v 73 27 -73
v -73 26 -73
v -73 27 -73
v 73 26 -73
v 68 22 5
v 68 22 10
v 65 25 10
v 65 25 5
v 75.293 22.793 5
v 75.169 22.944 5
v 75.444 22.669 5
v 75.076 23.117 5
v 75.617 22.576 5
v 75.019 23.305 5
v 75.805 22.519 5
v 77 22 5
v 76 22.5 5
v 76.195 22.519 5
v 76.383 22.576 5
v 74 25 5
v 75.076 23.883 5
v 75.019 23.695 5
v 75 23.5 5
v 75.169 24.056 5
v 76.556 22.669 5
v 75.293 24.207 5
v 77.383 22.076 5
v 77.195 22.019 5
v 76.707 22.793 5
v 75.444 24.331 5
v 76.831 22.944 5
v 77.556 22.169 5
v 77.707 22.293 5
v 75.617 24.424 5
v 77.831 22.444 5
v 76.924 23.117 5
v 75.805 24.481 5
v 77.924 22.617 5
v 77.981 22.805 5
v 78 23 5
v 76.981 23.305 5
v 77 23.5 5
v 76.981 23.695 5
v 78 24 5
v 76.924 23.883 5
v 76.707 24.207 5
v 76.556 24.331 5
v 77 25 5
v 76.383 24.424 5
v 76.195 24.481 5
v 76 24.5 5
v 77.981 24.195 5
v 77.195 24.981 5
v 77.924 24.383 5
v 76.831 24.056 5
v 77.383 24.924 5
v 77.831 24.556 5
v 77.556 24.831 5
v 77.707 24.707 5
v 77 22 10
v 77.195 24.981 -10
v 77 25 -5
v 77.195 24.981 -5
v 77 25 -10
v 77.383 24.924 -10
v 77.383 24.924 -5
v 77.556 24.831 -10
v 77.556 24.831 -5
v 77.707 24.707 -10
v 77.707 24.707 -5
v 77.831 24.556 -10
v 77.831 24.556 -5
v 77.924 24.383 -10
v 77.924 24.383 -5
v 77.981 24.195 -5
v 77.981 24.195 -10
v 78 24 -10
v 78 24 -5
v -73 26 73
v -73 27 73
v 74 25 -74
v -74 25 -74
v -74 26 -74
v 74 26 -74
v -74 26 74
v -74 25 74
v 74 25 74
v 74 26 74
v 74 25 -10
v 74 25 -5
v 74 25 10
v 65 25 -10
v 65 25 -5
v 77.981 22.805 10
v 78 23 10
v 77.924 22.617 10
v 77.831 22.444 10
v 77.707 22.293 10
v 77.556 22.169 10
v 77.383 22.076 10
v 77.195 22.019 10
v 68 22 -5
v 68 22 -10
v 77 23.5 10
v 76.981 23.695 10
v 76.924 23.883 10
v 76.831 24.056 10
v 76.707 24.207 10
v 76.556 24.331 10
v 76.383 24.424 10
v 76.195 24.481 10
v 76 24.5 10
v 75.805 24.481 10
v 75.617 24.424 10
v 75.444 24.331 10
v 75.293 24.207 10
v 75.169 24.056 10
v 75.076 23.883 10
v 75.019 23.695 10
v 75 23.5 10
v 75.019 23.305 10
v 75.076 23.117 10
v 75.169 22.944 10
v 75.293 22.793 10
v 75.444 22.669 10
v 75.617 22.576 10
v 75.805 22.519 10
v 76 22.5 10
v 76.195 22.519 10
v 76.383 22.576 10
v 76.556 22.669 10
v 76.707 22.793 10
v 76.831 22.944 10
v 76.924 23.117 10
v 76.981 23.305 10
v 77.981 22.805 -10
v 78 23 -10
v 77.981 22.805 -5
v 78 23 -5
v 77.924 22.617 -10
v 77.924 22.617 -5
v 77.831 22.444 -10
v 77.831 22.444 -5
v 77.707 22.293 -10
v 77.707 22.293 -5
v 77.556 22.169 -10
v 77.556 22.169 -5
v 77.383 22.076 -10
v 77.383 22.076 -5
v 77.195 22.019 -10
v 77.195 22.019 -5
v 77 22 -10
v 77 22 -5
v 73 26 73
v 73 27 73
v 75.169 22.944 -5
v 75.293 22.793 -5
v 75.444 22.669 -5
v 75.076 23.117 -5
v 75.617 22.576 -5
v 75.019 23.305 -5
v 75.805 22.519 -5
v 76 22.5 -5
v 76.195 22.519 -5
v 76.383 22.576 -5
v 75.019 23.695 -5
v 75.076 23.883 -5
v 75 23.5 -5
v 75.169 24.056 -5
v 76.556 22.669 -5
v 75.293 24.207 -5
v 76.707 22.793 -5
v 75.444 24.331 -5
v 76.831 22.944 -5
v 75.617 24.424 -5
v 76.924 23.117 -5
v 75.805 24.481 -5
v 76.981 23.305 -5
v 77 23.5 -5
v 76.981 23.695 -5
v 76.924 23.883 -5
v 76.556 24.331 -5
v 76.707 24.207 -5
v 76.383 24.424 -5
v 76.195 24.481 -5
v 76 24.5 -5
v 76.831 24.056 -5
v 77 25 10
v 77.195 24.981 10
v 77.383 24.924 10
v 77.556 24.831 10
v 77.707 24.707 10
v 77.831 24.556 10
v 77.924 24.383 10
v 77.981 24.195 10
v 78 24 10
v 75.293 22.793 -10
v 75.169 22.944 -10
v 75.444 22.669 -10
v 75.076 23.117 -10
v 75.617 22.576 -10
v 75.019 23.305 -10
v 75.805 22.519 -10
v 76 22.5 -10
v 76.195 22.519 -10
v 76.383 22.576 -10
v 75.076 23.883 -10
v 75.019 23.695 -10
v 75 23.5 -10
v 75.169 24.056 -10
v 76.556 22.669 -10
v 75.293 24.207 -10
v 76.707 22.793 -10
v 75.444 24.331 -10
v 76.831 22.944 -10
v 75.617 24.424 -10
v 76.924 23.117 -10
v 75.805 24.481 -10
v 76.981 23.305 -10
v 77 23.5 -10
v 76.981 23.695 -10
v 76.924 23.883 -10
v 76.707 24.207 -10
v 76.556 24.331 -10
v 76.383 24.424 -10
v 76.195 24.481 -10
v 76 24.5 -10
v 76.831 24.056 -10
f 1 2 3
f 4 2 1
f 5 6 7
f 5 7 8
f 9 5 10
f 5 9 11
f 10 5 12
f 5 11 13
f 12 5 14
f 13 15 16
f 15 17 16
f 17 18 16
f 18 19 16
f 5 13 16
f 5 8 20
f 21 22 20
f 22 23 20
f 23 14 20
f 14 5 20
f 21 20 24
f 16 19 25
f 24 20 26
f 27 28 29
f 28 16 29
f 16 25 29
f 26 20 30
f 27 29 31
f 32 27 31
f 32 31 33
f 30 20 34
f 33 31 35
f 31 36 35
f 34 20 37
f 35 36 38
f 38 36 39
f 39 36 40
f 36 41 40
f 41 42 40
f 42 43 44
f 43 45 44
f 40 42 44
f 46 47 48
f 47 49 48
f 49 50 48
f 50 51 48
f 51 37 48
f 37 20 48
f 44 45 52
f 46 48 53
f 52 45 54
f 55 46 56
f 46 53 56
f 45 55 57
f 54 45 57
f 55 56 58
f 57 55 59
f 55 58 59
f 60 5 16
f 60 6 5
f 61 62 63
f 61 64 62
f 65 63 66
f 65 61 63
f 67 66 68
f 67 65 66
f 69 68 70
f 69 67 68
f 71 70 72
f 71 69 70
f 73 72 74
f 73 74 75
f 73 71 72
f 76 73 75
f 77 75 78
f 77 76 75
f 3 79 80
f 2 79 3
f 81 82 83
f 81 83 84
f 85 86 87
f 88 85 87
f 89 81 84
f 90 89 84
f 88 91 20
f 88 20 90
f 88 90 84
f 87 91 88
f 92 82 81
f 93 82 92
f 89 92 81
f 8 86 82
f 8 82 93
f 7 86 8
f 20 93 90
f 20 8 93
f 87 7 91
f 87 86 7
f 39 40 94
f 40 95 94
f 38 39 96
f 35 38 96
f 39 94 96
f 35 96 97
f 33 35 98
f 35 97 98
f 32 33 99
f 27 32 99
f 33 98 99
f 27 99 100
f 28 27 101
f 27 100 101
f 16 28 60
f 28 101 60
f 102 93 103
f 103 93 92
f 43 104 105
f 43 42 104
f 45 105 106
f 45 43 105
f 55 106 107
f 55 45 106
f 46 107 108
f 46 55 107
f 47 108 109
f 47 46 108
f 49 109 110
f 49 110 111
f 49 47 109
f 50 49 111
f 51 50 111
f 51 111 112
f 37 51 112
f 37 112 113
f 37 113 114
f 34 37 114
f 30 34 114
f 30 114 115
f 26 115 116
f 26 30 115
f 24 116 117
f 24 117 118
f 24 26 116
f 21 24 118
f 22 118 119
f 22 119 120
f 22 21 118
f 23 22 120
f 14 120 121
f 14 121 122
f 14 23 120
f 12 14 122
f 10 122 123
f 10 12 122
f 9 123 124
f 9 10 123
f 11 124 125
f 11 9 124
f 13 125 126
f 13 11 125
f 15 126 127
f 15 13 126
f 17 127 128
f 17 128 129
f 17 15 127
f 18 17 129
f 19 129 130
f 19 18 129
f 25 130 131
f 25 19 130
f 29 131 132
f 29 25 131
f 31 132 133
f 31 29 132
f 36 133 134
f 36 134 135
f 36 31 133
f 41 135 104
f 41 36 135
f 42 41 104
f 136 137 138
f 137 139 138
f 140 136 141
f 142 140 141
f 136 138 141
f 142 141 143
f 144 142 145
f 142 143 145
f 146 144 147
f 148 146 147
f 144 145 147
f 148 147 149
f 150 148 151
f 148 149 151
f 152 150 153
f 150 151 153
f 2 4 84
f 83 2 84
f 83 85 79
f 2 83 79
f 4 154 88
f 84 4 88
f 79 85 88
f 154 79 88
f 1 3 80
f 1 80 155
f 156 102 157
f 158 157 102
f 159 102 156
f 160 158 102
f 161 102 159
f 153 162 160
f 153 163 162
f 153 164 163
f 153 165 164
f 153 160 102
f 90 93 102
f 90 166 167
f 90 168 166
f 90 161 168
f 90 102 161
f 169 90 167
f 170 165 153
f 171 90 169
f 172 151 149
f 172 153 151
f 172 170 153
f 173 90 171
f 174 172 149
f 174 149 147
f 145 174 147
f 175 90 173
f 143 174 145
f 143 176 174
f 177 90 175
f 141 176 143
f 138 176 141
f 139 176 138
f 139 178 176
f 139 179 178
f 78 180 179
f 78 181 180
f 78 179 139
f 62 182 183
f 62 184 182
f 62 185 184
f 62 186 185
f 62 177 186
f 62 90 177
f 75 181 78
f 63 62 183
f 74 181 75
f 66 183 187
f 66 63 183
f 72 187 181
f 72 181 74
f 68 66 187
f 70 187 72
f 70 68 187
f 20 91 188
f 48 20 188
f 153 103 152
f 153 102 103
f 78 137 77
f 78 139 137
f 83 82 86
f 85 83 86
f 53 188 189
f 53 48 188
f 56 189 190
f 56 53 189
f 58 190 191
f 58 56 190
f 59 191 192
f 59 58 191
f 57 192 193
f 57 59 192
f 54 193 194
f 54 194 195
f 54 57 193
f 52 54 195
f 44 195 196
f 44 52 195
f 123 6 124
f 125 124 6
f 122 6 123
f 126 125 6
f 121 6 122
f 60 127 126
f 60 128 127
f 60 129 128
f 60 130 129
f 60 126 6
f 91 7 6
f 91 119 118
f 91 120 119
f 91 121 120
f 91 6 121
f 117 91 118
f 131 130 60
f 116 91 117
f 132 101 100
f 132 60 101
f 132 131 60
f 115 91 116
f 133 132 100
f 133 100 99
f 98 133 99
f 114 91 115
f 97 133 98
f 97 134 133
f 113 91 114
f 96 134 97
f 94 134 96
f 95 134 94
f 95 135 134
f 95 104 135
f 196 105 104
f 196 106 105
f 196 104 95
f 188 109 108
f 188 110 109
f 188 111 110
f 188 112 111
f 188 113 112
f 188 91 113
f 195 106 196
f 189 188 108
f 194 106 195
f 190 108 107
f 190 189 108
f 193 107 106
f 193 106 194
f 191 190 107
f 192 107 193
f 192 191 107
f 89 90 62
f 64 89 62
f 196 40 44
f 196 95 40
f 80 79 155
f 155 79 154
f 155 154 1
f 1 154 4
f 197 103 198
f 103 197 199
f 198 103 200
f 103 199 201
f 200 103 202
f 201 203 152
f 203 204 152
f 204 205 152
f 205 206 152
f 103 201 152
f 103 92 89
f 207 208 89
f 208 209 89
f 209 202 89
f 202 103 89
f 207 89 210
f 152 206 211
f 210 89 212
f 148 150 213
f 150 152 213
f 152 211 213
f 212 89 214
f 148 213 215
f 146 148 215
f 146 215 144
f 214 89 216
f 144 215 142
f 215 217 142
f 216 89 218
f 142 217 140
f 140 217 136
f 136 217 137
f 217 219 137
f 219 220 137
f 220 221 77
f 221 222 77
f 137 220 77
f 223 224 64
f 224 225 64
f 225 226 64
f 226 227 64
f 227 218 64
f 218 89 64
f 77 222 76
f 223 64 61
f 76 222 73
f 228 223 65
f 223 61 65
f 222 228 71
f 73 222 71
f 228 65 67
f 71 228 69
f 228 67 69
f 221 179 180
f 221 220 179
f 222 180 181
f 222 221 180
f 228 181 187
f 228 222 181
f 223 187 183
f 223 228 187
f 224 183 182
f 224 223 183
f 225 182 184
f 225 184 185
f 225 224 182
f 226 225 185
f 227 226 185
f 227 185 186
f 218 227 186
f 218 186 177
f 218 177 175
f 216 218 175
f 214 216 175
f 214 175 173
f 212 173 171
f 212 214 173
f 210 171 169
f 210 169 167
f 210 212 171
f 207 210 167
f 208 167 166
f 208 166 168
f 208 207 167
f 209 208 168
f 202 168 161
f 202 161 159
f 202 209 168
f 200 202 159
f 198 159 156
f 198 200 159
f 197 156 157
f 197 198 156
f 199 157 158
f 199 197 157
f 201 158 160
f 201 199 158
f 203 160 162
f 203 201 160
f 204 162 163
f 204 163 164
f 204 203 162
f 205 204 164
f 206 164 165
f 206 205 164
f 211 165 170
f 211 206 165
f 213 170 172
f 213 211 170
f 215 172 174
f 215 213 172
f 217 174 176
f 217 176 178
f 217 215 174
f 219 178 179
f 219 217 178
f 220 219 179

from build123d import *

# Parameters (mm, degrees)
SKETCH1_R           = 10
SKETCH1_R_2         = 7.5
BOSS_EXTRUDE1_DEPTH = 25
THREAD1_PITCH       = 0.3175
SKETCH4_W           = 146
SKETCH4_H           = 146
BOSS_EXTRUDE2_DEPTH = 2
SKETCH5_W           = 148
SKETCH5_H           = 148
BOSS_EXTRUDE3_DEPTH = 1
BOSS_EXTRUDE4_START = 7.5
SKETCH6_W           = 10
SKETCH6_H           = 3
SKETCH6_R           = 1
BOSS_EXTRUDE4_DEPTH = 2.5
BOSS_EXTRUDE5_START = -7.5
SKETCH6_2_W         = 10
SKETCH6_2_H         = 3
SKETCH6_2_R         = 1
BOSS_EXTRUDE5_DEPTH = 2.5
SKETCH9_R           = 18.995637602
CUT_EXTRUDE1_DEPTH  = 111.385687501
CHAMFER1_SIZE       = 3
FILLET1_R           = 1


with BuildPart() as part:
    # Sketch1 → Boss-Extrude1 (new body)
    with BuildSketch(Plane(origin=(0, 0, 0), x_dir=(1, 0, 0), z_dir=(0, 1, 0))):
        with Locations(Location((0, 0, 0), (0, 0, 270))):
            Circle(SKETCH1_R)
        with Locations(Location((0, 0, 0), (0, 0, 270))):
            Circle(SKETCH1_R_2, mode=Mode.SUBTRACT)
    extrude(amount=BOSS_EXTRUDE1_DEPTH)

    # Thread1: the profile of Thread Profile1 profile screwed along a right-hand helix of 18.897638 turns, 6 arcs to a turn; built about Z, then put on its axis
    thread1_z = Axis((0, 0, 0), (0, 0, 1))
    thread1_corners = [(10.0003, 0, -0.000173205), (10.0003, 0, 0.277985704), (9.828148085, 0, 0.17859375), (9.828148085, 0, 0.09921875)]
    with BuildLine(mode=Mode.PRIVATE) as thread1_profile:
        Line(thread1_corners[0], thread1_corners[1])
        Line(thread1_corners[1], thread1_corners[2])
        Line(thread1_corners[2], thread1_corners[3])
        Line(thread1_corners[3], thread1_corners[0])
    thread1_cap = Face(thread1_profile.wire())
    thread1_turn_angles = [0, 30, 60, 90, 120, 150, 180, 210, 240, 270, 300, 330, 360]
    thread1_turn_weights = [1, 0.8660254037844387, 1, 0.8660254037844387, 1, 0.8660254037844387, 1, 0.8660254037844387, 1, 0.8660254037844387, 1, 0.8660254037844387, 1]
    thread1_turn_rails = [Edge.make_bspline([Vector(p[0], p[1], 0).rotate(thread1_z, thread1_turn_angles[k]) / thread1_turn_weights[k] + Vector(0, 0, p[2] + THREAD1_PITCH * thread1_turn_angles[k] / 360) for k in range(13)], [0, 0, 0, 1, 1, 2, 2, 3, 3, 4, 4, 5, 5, 6, 6, 6], 2, thread1_turn_weights) for p in thread1_corners]
    thread1_turn_sides = [Face.make_surface_from_curves(thread1_turn_rails[p[0]], thread1_turn_rails[p[1]]) for p in [(0, 1), (1, 2), (2, 3), (3, 0)]]
    thread1_last_angles = [6480, 6510, 6540, 6570, 6600, 6630, 6660, 6690, 6720, 6750, 6780, 6791.57480315, 6803.149606299]
    thread1_last_weights = [1, 0.8660254037844387, 1, 0.8660254037844387, 1, 0.8660254037844387, 1, 0.8660254037844387, 1, 0.8660254037844387, 1, 0.9796635825089068, 1]
    thread1_last_rails = [Edge.make_bspline([Vector(p[0], p[1], 0).rotate(thread1_z, thread1_last_angles[k]) / thread1_last_weights[k] + Vector(0, 0, p[2] + THREAD1_PITCH * thread1_last_angles[k] / 360) for k in range(13)], [0, 0, 0, 1, 1, 2, 2, 3, 3, 4, 4, 5, 5, 6, 6, 6], 2, thread1_last_weights) for p in thread1_corners]
    thread1_last_sides = [Face.make_surface_from_curves(thread1_last_rails[p[0]], thread1_last_rails[p[1]]) for p in [(0, 1), (1, 2), (2, 3), (3, 0)]]
    thread1 = Plane(origin=(0, -0.5, 0), x_dir=(1, 0, 0), z_dir=(0, 1, 0)) * Solid(Shell([*[p.moved(Location((0, 0, THREAD1_PITCH * i))) for i in range(18) for p in thread1_turn_sides], *thread1_last_sides, thread1_cap, thread1_cap.rotate(thread1_z, 6803.149606299).moved(Location((0, 0, THREAD1_PITCH * 6803.149606299 / 360)))]))
    add(thread1, mode=Mode.SUBTRACT)

    # Sketch4 → Boss-Extrude2 (add)
    with BuildSketch(Plane(origin=(0, 25, 0), x_dir=(1, 0, 0), z_dir=(0, 1, 0))):
        Rectangle(SKETCH4_W, SKETCH4_H)
    extrude(amount=BOSS_EXTRUDE2_DEPTH)

    # Sketch5 → Boss-Extrude3 (add)
    with BuildSketch(Plane.XZ.offset(-25)):
        Rectangle(SKETCH5_W, SKETCH5_H)
    extrude(amount=-BOSS_EXTRUDE3_DEPTH)

    # Sketch6 → Boss-Extrude4 (add, symmetric)
    with BuildSketch(Plane.XY.offset(BOSS_EXTRUDE4_START)):
        with Locations((73, 23.5)):
            Rectangle(SKETCH6_W, SKETCH6_H)
        with Locations((76, 23.5)):
            Circle(SKETCH6_R, mode=Mode.SUBTRACT)
    extrude(amount=BOSS_EXTRUDE4_DEPTH, both=True)

    # Sketch6<2> → Boss-Extrude5 (add, symmetric)
    with BuildSketch(Plane.XY.offset(BOSS_EXTRUDE5_START)):
        with Locations((73, 23.5)):
            Rectangle(SKETCH6_2_W, SKETCH6_2_H)
        with Locations((76, 23.5)):
            Circle(SKETCH6_2_R, mode=Mode.SUBTRACT)
    extrude(amount=BOSS_EXTRUDE5_DEPTH, both=True)

    # Sketch9 → Cut-Extrude1 (cut, through all)
    with BuildSketch(Plane.XZ.offset(-25)):
        Circle(SKETCH9_R)
    extrude(amount=CUT_EXTRUDE1_DEPTH, mode=Mode.SUBTRACT)

    # Chamfer1
    chamfer1_edges = [part.edges().sort_by_distance(p)[0] for p in [
        (68, 25, -7.5),
        (68, 25, 7.5),
    ]]
    chamfer(chamfer1_edges, length=CHAMFER1_SIZE - 0.0001)  # a hair under: the kernel refuses the full size

    # Fillet1
    fillet1_edges = [part.edges().sort_by_distance(p)[0] for p in [
        (78, 22, 7.5),
        (78, 25, 7.5),
        (78, 22, -7.5),
        (78, 25, -7.5),
    ]]
    fillet(fillet1_edges, radius=FILLET1_R)


solid = part.part
